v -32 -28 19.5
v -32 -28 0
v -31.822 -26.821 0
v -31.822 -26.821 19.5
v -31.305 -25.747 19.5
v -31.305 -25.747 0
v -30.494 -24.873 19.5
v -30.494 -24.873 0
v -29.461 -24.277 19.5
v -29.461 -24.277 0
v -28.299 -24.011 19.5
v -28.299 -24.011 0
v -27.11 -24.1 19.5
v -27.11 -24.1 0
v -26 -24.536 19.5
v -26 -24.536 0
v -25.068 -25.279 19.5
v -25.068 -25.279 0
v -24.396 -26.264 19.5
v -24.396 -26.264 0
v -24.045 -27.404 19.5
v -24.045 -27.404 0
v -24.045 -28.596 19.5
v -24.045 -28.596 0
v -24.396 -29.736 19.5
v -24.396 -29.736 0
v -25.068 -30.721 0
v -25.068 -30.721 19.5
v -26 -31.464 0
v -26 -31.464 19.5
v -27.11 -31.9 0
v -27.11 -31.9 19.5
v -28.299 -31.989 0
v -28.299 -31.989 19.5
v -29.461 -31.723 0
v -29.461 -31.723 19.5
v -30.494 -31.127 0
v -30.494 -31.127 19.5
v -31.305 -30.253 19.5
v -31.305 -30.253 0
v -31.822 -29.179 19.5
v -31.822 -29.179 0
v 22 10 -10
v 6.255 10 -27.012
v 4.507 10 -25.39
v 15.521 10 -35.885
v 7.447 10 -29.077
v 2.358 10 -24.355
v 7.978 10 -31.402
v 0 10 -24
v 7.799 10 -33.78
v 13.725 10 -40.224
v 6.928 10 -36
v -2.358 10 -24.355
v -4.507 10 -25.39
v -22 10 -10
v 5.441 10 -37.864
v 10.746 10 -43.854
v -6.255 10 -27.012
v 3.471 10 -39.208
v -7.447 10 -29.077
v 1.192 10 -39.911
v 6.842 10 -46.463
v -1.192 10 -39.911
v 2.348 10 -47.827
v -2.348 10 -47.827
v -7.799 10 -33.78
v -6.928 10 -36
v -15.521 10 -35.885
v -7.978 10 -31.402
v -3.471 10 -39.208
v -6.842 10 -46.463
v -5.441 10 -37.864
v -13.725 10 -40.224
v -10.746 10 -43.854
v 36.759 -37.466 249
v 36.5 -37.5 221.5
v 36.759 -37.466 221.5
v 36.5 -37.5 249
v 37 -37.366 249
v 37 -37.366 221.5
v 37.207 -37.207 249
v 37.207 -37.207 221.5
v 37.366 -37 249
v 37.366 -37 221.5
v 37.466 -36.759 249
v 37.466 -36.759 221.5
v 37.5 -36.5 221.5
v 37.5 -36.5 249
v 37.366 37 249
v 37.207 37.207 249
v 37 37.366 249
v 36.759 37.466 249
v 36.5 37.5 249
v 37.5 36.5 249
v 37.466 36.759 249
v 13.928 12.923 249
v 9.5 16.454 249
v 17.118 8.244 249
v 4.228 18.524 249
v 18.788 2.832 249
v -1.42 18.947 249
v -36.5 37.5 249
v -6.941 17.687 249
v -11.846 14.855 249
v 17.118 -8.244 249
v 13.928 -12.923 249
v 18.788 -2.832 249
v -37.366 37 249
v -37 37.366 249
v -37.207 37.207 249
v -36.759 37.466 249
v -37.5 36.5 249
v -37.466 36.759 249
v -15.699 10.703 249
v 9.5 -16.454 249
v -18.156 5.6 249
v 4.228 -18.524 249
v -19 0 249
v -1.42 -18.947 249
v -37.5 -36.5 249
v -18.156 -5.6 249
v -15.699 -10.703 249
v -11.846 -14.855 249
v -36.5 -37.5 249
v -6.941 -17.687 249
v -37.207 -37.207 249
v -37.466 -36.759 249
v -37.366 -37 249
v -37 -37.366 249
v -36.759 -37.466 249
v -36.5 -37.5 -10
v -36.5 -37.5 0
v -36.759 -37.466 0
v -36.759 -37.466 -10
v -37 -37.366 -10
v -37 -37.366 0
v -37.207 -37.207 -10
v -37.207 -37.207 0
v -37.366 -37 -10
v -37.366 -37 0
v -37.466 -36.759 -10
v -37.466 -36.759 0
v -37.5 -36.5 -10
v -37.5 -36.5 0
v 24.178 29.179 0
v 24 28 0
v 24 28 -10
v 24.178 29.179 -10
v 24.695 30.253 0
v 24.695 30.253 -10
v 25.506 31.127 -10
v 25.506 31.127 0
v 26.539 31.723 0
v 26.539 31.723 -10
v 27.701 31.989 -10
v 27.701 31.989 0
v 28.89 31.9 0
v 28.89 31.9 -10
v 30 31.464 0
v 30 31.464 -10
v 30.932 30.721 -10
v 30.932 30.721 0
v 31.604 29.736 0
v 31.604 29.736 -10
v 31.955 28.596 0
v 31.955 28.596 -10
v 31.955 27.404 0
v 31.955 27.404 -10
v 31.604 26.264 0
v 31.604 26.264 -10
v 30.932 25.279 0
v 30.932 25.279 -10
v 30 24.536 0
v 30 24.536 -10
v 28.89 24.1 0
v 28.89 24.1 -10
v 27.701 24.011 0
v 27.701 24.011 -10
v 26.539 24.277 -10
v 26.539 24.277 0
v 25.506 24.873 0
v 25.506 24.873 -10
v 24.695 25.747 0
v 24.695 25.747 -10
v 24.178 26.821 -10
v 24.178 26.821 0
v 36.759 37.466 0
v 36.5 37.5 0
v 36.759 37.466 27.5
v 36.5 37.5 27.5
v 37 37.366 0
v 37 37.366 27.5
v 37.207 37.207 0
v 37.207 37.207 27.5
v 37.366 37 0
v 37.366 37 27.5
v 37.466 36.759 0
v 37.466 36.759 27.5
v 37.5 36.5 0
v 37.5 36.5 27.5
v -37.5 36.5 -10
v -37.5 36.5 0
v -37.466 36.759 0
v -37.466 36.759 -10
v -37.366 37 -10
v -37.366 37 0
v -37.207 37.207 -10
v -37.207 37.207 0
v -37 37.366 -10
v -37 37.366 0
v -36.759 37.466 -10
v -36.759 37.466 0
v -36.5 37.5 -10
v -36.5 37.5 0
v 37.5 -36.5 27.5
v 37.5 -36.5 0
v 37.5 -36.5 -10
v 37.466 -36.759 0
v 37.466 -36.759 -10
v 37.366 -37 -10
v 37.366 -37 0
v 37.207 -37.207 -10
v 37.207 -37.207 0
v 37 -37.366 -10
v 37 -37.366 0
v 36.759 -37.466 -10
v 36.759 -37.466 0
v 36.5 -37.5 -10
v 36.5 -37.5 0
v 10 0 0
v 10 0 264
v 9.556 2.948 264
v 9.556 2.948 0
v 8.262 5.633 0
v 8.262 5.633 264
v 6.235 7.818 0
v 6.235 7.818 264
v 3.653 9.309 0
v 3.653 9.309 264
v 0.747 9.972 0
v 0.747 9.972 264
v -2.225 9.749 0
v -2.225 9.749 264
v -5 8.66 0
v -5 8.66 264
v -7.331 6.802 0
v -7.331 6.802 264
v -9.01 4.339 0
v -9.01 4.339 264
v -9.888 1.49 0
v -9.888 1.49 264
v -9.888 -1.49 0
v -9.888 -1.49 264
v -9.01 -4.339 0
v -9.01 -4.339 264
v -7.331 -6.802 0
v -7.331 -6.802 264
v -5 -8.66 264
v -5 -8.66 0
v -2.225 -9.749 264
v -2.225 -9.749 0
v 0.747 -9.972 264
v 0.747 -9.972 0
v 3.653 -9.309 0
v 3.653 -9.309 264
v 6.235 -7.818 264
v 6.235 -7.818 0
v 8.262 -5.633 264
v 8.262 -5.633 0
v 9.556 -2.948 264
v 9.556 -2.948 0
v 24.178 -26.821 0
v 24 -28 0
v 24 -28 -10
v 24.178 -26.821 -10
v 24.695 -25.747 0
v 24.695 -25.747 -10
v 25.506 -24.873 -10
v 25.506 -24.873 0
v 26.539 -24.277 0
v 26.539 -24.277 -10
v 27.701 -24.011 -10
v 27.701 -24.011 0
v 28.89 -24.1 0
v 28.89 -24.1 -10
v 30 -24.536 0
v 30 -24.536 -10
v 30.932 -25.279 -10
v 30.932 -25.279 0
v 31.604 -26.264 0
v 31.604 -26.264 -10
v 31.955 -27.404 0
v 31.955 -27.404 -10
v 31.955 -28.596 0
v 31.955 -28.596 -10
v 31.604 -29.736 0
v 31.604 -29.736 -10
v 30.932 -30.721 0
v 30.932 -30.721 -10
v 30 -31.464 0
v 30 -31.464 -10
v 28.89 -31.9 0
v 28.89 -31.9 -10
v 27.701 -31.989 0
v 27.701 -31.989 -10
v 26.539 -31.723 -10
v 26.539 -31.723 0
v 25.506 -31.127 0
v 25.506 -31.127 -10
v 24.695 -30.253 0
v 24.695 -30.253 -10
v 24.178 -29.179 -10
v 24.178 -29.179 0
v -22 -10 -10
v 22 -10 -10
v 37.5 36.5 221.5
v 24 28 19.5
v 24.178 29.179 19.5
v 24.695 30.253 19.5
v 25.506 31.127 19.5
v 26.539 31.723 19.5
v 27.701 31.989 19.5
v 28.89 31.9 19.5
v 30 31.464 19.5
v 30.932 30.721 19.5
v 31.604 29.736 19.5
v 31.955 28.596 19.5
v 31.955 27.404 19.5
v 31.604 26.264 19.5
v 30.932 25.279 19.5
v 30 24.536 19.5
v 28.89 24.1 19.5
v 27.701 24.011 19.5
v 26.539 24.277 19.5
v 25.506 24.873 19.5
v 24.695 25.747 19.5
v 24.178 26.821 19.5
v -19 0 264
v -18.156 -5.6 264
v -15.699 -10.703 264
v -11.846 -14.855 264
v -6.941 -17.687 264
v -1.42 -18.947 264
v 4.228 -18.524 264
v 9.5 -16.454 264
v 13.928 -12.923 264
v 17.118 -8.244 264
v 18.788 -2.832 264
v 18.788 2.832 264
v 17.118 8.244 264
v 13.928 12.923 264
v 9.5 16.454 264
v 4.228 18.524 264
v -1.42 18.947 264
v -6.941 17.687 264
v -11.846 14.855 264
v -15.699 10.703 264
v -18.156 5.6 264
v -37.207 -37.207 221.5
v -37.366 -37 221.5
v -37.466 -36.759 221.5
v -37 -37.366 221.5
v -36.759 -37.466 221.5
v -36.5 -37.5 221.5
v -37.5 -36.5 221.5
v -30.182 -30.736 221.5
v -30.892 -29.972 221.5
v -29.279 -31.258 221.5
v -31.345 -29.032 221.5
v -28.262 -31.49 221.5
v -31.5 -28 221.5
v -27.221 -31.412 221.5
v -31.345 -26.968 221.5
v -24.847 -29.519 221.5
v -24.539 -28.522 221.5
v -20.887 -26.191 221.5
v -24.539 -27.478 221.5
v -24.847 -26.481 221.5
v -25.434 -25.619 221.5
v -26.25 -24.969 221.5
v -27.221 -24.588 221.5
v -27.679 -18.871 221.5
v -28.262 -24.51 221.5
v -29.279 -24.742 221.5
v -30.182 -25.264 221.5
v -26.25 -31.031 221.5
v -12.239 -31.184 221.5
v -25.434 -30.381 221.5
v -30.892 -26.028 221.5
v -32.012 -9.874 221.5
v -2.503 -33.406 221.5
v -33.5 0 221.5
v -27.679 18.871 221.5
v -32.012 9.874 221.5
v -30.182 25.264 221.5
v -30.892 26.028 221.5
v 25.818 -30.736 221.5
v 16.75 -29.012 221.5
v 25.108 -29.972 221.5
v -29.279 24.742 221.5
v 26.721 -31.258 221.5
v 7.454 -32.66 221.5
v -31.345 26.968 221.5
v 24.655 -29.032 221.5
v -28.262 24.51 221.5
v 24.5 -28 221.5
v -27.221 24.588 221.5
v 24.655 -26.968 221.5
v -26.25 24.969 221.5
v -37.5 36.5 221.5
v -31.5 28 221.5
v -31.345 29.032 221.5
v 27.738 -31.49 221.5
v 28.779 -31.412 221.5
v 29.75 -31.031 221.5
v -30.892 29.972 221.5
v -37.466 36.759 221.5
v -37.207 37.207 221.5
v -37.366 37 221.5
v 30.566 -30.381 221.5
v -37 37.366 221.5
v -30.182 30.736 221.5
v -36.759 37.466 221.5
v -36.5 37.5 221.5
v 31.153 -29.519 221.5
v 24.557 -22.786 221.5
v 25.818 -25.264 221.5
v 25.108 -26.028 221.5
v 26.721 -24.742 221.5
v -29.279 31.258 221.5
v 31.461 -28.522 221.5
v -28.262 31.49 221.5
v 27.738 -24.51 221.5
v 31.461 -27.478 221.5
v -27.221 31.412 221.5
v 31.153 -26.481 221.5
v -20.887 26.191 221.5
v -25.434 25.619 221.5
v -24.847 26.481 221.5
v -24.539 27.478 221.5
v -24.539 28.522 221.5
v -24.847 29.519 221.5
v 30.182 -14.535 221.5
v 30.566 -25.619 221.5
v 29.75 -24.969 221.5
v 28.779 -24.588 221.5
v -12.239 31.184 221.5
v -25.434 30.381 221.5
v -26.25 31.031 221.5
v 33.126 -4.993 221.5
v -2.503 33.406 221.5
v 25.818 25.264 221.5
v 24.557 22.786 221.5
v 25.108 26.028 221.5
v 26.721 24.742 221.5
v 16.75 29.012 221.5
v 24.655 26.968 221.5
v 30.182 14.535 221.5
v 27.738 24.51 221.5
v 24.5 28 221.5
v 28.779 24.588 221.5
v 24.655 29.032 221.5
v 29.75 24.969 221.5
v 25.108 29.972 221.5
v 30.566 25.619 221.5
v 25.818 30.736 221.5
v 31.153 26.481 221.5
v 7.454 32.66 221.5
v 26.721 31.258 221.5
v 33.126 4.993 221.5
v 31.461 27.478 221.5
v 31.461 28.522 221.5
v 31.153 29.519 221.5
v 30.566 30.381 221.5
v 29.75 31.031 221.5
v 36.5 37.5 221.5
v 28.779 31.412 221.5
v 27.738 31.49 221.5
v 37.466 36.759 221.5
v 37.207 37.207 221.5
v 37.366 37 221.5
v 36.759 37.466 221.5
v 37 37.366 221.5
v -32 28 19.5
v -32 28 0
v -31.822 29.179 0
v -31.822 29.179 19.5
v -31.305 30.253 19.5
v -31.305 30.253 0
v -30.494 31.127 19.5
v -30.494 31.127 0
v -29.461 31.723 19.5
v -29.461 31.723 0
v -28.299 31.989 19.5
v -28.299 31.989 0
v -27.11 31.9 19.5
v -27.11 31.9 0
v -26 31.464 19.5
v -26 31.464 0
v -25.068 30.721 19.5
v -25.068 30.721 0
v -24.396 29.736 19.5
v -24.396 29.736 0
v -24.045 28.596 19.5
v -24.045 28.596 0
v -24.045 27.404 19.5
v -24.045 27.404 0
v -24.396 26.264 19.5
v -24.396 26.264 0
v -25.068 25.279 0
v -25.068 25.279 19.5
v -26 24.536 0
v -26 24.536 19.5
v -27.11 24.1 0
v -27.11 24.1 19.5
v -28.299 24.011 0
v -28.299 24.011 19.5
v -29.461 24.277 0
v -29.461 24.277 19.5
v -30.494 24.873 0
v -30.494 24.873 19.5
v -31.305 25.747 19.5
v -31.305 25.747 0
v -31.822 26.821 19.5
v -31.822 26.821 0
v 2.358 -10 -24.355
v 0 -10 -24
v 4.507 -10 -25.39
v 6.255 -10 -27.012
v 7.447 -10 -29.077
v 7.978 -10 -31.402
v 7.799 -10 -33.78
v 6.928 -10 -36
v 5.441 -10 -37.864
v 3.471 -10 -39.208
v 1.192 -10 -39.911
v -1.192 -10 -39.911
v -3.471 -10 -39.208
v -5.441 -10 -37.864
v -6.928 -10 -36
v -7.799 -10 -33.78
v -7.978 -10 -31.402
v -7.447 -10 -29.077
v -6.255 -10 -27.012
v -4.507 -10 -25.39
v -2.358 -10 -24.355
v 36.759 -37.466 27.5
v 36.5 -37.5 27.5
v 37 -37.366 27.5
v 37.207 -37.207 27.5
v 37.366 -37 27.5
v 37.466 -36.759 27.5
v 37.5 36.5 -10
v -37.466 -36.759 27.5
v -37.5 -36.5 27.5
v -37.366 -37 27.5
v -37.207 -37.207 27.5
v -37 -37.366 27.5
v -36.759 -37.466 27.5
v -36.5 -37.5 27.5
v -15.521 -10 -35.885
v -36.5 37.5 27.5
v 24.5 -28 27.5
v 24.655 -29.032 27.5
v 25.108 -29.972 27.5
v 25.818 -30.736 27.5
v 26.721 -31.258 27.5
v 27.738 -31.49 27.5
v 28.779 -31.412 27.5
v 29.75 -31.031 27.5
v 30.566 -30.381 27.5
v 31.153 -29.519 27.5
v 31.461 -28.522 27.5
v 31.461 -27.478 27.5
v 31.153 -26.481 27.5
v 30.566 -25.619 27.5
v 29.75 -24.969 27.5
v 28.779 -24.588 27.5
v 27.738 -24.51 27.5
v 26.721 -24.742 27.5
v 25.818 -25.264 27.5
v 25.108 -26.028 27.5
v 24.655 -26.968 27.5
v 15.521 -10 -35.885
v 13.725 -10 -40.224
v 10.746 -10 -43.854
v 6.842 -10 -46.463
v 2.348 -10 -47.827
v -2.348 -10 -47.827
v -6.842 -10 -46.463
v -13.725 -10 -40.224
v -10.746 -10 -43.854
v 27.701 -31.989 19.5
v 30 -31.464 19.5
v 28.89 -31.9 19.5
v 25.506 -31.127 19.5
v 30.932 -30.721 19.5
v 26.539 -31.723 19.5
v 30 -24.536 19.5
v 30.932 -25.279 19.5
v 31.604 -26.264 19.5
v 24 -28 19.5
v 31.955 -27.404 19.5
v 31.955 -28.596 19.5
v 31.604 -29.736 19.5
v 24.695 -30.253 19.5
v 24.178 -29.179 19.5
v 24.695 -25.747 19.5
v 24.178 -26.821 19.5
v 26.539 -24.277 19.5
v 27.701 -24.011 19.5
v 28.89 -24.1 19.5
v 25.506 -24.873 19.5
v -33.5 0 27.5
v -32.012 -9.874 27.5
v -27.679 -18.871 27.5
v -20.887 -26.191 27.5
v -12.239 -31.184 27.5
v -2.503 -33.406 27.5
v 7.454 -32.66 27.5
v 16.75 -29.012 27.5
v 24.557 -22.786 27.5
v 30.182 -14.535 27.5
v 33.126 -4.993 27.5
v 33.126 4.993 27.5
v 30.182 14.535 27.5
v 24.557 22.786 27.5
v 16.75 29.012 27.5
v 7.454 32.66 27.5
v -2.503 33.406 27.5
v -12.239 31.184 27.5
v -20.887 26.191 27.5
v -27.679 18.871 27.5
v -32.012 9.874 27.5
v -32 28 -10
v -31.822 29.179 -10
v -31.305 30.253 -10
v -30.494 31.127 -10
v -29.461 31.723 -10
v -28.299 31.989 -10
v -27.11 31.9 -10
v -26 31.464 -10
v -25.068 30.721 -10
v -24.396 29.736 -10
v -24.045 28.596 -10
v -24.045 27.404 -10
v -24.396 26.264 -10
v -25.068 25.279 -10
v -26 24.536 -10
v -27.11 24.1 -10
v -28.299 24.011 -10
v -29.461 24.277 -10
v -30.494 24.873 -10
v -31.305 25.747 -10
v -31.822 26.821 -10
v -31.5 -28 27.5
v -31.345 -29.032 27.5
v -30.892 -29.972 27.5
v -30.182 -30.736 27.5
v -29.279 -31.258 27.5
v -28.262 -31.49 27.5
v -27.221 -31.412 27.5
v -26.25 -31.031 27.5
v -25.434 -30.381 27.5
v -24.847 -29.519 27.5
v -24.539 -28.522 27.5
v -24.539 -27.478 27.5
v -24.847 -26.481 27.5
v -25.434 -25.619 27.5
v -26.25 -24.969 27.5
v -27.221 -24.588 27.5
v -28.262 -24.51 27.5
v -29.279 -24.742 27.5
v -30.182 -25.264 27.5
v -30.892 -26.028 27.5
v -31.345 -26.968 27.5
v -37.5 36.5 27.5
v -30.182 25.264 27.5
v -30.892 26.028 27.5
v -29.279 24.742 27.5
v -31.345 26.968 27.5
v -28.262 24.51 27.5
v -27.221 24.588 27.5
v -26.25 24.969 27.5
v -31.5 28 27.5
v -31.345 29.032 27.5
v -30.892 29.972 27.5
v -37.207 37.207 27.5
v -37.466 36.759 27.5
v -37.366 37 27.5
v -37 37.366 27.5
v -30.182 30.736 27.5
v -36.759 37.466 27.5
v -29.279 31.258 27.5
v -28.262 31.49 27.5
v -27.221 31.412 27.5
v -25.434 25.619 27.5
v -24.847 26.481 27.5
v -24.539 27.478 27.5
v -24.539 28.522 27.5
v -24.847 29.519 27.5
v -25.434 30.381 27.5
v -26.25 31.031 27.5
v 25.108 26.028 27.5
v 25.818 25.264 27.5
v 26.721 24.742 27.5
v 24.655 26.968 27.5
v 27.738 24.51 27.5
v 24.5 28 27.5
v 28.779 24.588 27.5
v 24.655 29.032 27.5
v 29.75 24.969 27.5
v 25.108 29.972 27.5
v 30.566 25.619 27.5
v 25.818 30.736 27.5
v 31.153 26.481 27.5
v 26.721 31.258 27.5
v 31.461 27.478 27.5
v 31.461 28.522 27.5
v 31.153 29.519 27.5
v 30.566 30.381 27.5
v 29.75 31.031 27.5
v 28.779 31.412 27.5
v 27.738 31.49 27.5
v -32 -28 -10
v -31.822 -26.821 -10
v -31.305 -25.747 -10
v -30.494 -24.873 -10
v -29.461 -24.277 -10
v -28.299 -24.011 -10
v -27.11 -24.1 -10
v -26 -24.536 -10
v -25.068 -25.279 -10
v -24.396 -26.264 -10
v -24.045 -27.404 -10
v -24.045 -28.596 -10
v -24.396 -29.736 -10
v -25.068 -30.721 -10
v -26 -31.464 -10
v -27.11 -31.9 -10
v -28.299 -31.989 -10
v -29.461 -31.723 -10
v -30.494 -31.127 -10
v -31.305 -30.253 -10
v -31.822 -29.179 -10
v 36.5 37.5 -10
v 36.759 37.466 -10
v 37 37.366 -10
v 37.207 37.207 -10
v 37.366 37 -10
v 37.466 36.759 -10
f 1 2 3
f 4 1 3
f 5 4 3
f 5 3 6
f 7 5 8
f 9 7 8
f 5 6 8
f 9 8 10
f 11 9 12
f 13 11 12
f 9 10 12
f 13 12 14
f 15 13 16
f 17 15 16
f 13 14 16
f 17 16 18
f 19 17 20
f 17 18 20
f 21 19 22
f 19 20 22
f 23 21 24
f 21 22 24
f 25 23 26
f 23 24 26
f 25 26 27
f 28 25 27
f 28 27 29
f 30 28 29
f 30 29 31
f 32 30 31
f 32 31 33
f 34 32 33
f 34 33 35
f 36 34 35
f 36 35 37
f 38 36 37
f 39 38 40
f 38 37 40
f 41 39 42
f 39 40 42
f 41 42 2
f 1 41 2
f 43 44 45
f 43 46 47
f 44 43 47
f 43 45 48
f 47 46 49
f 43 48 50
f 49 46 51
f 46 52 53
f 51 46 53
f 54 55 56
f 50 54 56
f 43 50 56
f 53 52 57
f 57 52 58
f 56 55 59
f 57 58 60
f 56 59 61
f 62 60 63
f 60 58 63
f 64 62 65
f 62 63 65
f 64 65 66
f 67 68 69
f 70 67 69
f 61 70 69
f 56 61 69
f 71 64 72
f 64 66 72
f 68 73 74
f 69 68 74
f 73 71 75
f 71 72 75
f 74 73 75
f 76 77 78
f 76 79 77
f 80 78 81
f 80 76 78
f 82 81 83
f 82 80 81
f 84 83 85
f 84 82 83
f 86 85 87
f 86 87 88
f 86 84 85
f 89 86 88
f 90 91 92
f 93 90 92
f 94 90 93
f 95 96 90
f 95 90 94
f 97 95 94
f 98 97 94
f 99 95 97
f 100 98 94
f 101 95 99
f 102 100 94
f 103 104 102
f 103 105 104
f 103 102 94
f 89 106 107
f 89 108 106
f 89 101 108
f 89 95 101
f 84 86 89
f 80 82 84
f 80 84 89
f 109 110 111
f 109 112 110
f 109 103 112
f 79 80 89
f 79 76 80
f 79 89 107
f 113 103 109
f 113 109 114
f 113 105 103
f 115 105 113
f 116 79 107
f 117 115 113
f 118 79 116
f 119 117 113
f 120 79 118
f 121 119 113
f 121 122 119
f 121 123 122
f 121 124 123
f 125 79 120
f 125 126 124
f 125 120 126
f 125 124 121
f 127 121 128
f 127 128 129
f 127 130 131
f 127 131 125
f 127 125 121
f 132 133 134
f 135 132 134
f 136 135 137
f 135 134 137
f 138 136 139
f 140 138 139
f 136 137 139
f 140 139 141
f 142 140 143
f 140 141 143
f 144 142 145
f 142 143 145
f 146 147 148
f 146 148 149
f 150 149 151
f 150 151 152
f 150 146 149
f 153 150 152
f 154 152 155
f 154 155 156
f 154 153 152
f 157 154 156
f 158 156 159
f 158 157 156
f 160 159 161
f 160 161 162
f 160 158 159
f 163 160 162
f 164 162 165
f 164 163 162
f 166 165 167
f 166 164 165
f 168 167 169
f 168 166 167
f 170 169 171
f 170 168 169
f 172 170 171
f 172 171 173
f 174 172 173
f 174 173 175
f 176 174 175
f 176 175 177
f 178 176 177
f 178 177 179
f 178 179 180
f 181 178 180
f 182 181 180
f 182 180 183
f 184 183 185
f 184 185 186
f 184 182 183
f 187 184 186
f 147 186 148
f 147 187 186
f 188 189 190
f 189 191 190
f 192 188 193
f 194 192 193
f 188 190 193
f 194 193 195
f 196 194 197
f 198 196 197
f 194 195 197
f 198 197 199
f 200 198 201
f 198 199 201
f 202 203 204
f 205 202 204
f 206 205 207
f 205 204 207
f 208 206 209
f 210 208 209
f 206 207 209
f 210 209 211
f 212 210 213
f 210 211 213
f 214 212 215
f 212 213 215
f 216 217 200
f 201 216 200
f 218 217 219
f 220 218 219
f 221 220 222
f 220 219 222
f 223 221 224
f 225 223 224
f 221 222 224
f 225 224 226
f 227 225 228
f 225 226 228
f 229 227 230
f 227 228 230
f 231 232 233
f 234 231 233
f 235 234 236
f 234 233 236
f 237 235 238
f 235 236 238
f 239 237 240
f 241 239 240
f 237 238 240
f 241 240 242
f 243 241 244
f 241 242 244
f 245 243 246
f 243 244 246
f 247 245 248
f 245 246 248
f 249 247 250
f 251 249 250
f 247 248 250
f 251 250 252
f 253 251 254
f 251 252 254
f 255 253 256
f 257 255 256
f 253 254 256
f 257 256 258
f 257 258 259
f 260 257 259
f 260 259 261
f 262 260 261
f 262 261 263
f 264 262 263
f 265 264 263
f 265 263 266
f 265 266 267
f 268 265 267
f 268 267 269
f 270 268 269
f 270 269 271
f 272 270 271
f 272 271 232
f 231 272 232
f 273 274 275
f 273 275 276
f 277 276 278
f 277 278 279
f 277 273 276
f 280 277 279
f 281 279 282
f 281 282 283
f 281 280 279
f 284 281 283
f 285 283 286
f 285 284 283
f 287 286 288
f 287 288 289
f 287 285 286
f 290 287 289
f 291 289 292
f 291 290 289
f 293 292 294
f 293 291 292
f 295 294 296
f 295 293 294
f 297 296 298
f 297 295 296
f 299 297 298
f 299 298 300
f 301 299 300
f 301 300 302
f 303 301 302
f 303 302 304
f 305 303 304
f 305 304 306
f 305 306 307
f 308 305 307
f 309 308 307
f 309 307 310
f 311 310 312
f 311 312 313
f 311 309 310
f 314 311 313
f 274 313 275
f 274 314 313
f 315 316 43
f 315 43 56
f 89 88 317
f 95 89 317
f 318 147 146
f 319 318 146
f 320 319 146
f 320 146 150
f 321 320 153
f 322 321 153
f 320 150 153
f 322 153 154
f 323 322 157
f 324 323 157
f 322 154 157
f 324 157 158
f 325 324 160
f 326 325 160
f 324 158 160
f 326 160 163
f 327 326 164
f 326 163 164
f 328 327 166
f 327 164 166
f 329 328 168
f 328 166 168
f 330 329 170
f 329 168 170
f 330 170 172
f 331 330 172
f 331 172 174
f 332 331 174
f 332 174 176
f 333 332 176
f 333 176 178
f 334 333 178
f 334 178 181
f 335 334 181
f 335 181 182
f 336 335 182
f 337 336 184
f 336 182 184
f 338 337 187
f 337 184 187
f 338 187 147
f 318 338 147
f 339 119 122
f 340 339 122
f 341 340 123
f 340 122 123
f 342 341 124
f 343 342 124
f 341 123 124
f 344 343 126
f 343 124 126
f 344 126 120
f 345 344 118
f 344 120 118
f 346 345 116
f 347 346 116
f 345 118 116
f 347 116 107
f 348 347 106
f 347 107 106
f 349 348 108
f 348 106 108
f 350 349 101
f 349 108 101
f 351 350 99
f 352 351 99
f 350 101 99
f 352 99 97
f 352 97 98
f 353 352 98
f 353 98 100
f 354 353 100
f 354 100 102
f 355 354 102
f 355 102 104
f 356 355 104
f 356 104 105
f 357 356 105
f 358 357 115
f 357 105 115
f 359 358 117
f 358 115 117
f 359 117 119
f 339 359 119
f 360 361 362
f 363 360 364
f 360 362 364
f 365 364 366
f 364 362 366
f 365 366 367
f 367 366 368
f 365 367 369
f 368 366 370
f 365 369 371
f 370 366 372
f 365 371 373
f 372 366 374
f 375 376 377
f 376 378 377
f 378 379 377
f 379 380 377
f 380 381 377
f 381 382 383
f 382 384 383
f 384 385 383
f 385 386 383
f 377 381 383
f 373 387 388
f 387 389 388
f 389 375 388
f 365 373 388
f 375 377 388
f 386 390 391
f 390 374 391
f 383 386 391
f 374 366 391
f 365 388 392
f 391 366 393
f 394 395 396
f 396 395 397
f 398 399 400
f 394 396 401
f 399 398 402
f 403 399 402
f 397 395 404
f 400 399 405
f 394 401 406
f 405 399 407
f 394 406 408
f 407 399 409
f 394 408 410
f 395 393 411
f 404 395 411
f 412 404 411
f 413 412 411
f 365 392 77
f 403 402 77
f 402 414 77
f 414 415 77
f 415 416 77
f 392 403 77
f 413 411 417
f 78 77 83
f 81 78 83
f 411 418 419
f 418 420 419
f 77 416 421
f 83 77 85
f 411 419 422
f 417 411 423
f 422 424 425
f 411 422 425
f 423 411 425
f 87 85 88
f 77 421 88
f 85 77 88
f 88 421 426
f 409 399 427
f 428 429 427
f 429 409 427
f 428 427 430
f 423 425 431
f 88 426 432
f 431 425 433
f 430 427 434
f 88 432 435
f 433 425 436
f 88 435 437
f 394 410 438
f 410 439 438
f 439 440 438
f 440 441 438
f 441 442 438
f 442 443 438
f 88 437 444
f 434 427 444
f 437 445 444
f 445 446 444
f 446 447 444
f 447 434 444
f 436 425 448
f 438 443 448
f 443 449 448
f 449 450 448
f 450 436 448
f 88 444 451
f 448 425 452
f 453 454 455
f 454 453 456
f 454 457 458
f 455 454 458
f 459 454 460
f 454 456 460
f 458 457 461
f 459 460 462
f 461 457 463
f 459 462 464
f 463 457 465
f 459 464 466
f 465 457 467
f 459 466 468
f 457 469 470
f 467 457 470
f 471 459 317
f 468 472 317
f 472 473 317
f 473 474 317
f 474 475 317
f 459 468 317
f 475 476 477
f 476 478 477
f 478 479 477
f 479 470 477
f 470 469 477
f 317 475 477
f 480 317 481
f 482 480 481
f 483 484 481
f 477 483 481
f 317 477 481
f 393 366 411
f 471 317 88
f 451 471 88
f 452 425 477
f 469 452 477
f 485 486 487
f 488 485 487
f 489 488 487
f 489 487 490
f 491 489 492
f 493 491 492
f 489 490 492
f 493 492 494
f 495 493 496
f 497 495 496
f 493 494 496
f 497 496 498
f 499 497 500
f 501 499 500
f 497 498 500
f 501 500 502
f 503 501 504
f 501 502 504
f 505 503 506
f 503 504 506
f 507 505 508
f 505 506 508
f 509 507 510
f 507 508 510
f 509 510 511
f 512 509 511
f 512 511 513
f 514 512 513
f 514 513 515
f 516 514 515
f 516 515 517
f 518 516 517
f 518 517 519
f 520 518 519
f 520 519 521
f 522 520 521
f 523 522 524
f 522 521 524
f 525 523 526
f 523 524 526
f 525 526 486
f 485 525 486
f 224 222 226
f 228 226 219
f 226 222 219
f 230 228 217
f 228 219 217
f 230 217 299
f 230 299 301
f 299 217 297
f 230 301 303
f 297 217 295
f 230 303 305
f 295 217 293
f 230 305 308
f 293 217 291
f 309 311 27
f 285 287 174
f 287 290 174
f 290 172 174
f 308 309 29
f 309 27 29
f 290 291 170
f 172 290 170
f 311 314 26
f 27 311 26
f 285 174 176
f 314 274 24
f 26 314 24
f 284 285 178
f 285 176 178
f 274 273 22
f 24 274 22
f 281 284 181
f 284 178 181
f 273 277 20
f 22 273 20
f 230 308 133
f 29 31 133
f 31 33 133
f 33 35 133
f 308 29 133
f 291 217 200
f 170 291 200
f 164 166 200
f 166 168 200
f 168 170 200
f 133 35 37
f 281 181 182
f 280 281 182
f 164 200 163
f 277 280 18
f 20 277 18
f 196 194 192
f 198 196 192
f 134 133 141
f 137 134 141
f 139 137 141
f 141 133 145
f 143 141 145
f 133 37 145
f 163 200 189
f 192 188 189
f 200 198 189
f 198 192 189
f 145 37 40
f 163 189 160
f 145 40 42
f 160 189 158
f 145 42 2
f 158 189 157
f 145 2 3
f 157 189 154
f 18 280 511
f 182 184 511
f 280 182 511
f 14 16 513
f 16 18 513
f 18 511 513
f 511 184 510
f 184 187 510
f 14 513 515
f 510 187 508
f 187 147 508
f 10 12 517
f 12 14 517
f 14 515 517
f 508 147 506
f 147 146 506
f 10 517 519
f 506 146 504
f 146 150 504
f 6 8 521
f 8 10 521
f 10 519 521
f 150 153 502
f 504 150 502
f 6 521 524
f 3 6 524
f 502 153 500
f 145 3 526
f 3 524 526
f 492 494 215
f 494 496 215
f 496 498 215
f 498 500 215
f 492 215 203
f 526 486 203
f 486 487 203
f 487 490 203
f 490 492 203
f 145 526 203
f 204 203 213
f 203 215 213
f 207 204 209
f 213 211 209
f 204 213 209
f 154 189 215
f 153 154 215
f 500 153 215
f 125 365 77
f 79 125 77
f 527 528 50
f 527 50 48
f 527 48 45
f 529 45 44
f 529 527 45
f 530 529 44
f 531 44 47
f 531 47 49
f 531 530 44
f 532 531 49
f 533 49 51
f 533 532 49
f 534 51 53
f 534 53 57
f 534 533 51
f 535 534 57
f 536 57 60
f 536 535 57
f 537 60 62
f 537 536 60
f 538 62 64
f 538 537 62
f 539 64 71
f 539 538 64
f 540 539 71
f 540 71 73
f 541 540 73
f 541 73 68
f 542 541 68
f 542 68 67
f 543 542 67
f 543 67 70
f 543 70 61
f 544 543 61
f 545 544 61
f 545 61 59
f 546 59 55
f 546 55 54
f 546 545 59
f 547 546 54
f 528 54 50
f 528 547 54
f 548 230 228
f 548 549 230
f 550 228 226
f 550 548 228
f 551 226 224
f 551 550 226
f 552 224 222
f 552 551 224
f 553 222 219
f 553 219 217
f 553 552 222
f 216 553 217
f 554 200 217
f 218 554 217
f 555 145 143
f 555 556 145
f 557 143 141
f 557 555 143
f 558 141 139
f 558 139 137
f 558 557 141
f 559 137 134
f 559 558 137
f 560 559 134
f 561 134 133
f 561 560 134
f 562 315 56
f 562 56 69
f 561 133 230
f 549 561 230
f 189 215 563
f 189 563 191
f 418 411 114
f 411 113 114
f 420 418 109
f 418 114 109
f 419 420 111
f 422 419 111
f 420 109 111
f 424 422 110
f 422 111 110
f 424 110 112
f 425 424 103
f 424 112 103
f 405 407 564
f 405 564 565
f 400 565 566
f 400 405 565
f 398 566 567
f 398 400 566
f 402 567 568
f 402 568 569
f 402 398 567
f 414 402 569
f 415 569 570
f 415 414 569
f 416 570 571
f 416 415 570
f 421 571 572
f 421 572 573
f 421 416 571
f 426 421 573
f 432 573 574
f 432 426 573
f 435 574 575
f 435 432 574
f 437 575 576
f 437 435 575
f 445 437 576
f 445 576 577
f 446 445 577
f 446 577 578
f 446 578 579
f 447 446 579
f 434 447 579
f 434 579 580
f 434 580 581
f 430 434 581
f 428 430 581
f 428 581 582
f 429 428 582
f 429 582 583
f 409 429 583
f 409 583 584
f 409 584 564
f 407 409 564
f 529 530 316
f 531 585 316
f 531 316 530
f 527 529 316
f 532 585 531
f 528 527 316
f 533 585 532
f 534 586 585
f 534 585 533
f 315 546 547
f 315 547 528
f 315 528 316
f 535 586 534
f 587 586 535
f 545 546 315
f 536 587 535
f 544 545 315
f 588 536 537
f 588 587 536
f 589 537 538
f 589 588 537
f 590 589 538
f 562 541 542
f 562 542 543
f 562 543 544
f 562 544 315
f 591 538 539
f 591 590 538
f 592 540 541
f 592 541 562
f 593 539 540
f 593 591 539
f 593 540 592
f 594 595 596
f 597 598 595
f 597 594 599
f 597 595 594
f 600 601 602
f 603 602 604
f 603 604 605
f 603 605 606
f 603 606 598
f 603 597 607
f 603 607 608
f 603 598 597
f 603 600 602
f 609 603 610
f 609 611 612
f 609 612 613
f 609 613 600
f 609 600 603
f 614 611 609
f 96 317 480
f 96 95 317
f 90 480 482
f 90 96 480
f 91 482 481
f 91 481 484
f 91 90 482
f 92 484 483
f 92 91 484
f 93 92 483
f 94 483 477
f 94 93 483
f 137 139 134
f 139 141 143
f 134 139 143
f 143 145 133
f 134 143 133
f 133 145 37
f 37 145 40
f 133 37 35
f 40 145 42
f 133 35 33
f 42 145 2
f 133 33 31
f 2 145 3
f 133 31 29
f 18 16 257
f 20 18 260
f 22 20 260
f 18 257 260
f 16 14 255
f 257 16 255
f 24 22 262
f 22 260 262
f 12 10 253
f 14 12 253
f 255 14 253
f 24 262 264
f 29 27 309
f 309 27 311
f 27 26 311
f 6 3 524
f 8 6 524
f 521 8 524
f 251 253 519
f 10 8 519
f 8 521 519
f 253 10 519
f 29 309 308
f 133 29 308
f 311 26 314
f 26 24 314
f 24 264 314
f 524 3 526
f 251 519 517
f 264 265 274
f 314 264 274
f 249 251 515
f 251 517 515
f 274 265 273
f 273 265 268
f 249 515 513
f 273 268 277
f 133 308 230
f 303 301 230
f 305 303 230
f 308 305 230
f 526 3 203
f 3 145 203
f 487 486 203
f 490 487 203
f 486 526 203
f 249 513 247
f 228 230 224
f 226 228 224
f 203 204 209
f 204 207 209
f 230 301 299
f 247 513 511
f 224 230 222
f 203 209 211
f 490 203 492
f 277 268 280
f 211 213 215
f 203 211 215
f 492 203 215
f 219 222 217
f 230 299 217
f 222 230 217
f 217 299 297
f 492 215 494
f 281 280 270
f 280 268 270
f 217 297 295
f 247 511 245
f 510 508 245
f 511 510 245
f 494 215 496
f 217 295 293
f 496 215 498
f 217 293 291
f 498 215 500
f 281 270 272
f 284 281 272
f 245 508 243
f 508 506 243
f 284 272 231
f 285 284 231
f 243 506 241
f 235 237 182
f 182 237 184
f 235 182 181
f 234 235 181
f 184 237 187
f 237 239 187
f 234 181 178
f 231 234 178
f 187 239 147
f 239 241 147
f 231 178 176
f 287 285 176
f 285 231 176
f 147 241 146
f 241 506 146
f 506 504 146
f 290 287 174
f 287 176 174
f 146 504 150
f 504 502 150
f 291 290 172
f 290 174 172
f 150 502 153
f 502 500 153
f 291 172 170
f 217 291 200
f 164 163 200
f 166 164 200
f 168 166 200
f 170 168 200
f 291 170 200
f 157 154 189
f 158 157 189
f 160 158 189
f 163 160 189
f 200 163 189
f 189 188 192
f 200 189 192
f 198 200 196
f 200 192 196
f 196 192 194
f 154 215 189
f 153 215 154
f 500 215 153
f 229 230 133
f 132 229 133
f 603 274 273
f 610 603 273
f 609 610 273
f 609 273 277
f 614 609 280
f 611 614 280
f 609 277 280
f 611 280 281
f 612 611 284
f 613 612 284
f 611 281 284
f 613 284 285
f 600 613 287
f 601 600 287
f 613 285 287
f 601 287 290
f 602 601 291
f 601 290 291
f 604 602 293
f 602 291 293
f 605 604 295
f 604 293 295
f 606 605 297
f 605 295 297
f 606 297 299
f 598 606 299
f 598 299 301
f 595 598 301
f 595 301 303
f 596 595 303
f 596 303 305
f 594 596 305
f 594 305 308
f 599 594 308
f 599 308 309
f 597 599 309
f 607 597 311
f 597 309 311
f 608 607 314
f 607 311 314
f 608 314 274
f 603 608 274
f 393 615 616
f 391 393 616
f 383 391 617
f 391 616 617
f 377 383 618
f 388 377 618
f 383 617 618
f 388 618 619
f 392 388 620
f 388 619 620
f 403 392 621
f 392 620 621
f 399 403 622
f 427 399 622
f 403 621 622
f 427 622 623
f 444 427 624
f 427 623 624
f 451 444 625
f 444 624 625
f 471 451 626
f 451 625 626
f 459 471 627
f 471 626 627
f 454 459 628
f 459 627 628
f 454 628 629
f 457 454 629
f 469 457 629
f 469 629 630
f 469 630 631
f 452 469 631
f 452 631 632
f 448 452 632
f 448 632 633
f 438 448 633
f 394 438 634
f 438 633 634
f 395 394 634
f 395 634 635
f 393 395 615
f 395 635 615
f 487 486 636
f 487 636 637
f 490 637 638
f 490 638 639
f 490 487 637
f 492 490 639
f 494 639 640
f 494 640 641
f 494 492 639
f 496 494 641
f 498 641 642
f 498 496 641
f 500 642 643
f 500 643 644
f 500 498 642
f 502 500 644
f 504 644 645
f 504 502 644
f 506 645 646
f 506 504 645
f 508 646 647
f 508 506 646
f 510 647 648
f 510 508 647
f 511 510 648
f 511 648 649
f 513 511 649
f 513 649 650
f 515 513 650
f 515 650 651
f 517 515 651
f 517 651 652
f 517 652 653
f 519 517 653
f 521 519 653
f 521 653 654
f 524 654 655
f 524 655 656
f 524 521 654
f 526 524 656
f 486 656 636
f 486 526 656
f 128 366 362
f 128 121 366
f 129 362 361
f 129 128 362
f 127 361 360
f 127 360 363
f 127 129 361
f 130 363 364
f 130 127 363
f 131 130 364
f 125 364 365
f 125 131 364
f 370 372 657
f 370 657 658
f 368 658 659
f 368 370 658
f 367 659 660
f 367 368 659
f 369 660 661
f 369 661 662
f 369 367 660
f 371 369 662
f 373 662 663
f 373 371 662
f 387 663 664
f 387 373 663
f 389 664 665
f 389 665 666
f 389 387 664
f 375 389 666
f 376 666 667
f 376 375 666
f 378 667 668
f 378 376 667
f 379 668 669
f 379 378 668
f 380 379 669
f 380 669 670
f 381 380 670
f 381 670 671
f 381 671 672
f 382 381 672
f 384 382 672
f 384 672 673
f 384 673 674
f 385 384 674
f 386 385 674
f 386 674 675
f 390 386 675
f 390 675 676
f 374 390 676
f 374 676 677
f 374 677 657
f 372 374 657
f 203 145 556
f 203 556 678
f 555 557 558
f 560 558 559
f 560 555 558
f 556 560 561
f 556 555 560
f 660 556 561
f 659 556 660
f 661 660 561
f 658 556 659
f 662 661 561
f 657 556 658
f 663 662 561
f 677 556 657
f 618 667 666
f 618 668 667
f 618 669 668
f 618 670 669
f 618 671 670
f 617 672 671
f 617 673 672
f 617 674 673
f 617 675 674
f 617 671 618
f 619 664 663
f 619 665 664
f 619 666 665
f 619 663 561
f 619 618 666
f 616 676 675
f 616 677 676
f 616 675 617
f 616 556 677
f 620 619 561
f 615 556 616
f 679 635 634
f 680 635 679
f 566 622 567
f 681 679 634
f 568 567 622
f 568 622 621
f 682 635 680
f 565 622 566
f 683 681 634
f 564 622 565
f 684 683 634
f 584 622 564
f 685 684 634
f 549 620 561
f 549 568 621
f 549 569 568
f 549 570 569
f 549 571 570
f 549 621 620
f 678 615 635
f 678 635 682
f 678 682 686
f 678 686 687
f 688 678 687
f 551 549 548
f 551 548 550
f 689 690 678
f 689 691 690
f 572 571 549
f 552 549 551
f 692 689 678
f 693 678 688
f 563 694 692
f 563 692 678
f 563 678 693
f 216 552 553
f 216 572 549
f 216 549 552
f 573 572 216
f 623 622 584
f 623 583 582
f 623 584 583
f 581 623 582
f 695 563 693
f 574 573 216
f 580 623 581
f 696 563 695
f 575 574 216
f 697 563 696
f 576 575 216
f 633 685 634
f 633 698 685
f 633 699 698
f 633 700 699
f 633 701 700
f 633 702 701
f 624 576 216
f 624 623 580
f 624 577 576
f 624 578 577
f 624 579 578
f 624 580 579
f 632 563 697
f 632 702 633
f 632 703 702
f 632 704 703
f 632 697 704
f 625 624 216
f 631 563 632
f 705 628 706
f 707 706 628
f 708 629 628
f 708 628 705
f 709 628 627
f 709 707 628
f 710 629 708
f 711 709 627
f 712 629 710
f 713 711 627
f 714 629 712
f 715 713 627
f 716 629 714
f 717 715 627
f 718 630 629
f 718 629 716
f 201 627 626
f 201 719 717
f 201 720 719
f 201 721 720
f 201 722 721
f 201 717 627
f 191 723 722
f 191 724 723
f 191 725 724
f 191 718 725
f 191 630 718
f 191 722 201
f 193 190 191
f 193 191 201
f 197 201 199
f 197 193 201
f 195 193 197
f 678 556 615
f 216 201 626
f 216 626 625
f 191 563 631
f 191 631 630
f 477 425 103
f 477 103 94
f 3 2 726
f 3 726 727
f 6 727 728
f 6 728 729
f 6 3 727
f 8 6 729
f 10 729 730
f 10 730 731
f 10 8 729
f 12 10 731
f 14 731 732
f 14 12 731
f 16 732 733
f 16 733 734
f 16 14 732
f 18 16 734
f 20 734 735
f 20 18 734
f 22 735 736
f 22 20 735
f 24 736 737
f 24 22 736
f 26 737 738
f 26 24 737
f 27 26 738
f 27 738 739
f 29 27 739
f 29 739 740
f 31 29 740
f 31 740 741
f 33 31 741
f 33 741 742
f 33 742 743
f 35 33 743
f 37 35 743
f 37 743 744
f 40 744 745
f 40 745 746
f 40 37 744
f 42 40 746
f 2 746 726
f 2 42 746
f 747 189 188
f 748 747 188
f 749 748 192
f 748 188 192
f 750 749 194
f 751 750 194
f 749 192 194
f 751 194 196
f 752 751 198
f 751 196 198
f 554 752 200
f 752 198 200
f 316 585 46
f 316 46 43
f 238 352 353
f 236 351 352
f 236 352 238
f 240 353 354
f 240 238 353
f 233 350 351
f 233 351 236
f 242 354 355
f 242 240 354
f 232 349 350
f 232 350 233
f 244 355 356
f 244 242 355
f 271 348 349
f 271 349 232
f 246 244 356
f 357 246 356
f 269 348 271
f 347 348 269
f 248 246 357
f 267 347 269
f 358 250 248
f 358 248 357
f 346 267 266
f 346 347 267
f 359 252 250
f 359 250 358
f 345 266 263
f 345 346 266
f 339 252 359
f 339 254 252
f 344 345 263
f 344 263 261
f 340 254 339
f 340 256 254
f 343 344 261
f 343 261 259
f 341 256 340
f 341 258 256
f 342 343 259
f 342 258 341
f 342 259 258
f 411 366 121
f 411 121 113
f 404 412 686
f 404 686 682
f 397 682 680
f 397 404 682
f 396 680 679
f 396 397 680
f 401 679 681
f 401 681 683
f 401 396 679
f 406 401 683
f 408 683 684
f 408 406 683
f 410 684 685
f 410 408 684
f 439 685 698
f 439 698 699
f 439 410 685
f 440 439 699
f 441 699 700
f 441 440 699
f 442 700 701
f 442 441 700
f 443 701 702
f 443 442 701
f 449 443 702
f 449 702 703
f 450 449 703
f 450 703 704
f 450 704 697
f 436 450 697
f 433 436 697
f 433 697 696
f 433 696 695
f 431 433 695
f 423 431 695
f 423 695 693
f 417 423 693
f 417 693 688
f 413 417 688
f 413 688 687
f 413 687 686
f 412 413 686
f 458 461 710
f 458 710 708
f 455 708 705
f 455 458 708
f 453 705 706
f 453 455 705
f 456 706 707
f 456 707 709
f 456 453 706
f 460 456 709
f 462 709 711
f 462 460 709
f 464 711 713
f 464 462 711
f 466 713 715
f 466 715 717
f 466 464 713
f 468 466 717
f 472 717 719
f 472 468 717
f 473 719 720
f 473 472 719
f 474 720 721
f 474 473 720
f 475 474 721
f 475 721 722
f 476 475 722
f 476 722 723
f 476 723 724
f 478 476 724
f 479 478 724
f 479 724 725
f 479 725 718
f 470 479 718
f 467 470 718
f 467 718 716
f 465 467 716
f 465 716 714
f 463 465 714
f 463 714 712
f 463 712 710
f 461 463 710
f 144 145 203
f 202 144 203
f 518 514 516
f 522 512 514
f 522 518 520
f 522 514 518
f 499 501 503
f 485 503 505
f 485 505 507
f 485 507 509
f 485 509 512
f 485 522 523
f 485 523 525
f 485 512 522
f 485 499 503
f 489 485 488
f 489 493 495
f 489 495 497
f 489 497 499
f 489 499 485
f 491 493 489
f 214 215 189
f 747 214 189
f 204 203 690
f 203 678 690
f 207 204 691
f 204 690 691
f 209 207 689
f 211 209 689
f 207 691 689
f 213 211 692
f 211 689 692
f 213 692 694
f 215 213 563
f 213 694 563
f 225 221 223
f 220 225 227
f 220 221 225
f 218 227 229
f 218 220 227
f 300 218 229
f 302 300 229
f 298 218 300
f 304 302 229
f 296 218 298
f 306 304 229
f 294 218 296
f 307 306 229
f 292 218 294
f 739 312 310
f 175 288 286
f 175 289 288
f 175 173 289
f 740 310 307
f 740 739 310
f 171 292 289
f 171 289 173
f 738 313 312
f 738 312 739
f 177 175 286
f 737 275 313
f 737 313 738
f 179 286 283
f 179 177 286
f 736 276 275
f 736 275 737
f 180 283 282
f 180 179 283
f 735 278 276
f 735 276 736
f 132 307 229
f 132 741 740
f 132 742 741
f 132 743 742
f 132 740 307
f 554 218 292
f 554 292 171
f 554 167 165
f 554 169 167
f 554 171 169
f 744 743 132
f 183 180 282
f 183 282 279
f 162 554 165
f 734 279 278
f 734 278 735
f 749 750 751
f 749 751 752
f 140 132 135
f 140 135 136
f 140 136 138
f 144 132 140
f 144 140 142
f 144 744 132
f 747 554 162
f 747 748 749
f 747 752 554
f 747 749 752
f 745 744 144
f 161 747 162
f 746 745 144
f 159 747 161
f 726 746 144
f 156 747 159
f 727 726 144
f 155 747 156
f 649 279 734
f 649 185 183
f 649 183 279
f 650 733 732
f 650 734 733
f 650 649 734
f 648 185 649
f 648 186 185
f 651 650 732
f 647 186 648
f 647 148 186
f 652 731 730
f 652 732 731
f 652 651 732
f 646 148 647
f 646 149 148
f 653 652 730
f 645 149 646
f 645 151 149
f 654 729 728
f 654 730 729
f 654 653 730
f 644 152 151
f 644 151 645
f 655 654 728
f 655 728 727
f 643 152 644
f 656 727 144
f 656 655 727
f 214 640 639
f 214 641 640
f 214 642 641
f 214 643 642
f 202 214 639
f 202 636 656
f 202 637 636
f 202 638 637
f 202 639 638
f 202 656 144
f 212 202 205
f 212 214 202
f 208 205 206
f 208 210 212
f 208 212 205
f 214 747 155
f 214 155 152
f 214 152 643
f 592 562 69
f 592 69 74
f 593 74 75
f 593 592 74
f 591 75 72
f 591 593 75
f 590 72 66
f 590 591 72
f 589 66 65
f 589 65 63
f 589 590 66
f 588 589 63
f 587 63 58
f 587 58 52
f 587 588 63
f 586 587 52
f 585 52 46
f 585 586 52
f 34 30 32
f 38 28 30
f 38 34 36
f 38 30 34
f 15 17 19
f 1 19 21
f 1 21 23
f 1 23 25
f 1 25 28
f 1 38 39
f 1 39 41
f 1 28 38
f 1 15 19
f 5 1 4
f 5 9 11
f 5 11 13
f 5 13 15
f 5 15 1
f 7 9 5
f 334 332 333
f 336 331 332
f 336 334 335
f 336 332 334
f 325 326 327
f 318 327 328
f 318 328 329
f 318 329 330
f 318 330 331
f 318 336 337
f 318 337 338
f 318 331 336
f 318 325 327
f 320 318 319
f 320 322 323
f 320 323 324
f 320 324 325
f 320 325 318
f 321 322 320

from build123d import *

# Parameters (mm, degrees)
SKETCH1_W                = 75
SKETCH1_H                = 75
BOSS_EXTRUDE1_DEPTH      = 27.5
SKETCH2_R                = 33.5
BOSS_EXTRUDE2_DEPTH      = 194
SKETCH3_W                = 75
SKETCH3_H                = 75
BOSS_EXTRUDE3_DEPTH      = 27.5
SKETCH4_R                = 3.5
BOSS_EXTRUDE4_DEPTH      = 234.5
SKETCH5_R                = 4
CUT_EXTRUDE1_DEPTH       = 19.5
FILLET1_R                = 1
SKETCH6_R                = 19
BOSS_EXTRUDE5_DEPTH      = 15
SKETCH7_R                = 10
CUT_EXTRUDE2_DEPTH       = 300
SKETCH9_R                = 4
BOSS_EXTRUDE6_DEPTH      = 10
BOSS_EXTRUDE7_DEPTH      = 10
BOSS_EXTRUDE7_DEPTH_BACK = 10
SKETCH10_R               = 8


with BuildPart() as part:
    # Sketch1 → Boss-Extrude1 (new body)
    with BuildSketch(Plane.XY):
        Rectangle(SKETCH1_W, SKETCH1_H)
    extrude(amount=BOSS_EXTRUDE1_DEPTH)

    # Sketch2 → Boss-Extrude2 (add)
    with BuildSketch(Plane.XY.offset(27.5)):
        with Locations(Location((0, 0, 0), (0, 0, 180))):
            Circle(SKETCH2_R)
    extrude(amount=BOSS_EXTRUDE2_DEPTH)

    # Sketch3 → Boss-Extrude3 (add)
    with BuildSketch(Plane.XY.offset(221.5)):
        Rectangle(SKETCH3_W, SKETCH3_H)
    extrude(amount=BOSS_EXTRUDE3_DEPTH)

    # Sketch4 → Boss-Extrude4 (add)
    with BuildSketch(Plane.XY.offset(249)):
        with Locations(Location((-28, 28, 0), (0, 0, 180))):
            Circle(SKETCH4_R)
        with Locations(Location((28, 28, 0), (0, 0, 180))):
            Circle(SKETCH4_R)
        with Locations(Location((28, -28, 0), (0, 0, 180))):
            Circle(SKETCH4_R)
        with Locations(Location((-28, -28, 0), (0, 0, 180))):
            Circle(SKETCH4_R)
    extrude(amount=-BOSS_EXTRUDE4_DEPTH)

    # Sketch5 → Cut-Extrude1 (cut)
    with BuildSketch(Plane(origin=(0, 0, 0), x_dir=(-1, 0, 0), z_dir=(0, 0, -1))):
        with Locations((-28, 28)):
            Circle(SKETCH5_R)
        with Locations((28, 28)):
            Circle(SKETCH5_R)
        with Locations((28, -28)):
            Circle(SKETCH5_R)
        with Locations((-28, -28)):
            Circle(SKETCH5_R)
    extrude(amount=-CUT_EXTRUDE1_DEPTH, mode=Mode.SUBTRACT)

    # Fillet1
    fillet1_edges = [part.edges().sort_by_distance(p)[0] for p in [
        (37.5, -37.5, 235.25),
        (37.5, 37.5, 235.25),
        (-37.5, 37.5, 235.25),
        (-37.5, -37.5, 235.25),
        (37.5, -37.5, 13.75),
        (-37.5, -37.5, 13.75),
        (-37.5, 37.5, 13.75),
        (37.5, 37.5, 13.75),
    ]]
    fillet(fillet1_edges, radius=FILLET1_R)

    # Sketch6 → Boss-Extrude5 (add)
    with BuildSketch(Plane.XY.offset(249)):
        with Locations(Location((0, 0, 0), (0, 0, 180))):
            Circle(SKETCH6_R)
    extrude(amount=BOSS_EXTRUDE5_DEPTH)

    # Sketch7 → Cut-Extrude2 (cut)
    with BuildSketch(Plane.XY.offset(264)):
        Circle(SKETCH7_R)
    extrude(amount=-CUT_EXTRUDE2_DEPTH, mode=Mode.SUBTRACT)


with BuildPart() as body_2:
    # Sketch9 → Boss-Extrude6 (new body)
    with BuildSketch(Plane(origin=(0, 0, 0), x_dir=(-1, 0, 0), z_dir=(0, 0, -1))):
        with BuildLine():
            Line((37.5, -36.5), (37.5, 36.5))
            ThreePointArc((37.5, 36.5), (37.207106781, 37.207106781), (36.5, 37.5))
            Line((36.5, 37.5), (-36.5, 37.5))
            ThreePointArc((-36.5, 37.5), (-37.207106781, 37.207106781), (-37.5, 36.5))
            Line((-37.5, 36.5), (-37.5, -36.5))
            ThreePointArc((-37.5, -36.5), (-37.207106781, -37.207106781), (-36.5, -37.5))
            Line((-36.5, -37.5), (36.5, -37.5))
            ThreePointArc((36.5, -37.5), (37.207106781, -37.207106781), (37.5, -36.5))
        make_face()
        with Locations((-28, 28)):
            Circle(SKETCH9_R, mode=Mode.SUBTRACT)
        with Locations((28, 28)):
            Circle(SKETCH9_R, mode=Mode.SUBTRACT)
        with Locations((28, -28)):
            Circle(SKETCH9_R, mode=Mode.SUBTRACT)
        with Locations((-28, -28)):
            Circle(SKETCH9_R, mode=Mode.SUBTRACT)
    extrude(amount=BOSS_EXTRUDE6_DEPTH)


with BuildPart() as body_3:
    # Sketch10 → Boss-Extrude7 (new, two sides: drawn at the far end of the back side and taken through both)
    with BuildSketch(Plane(origin=(0, 0, 0), x_dir=(1, 0, 0), z_dir=(0, 1, 0)).offset(-BOSS_EXTRUDE7_DEPTH_BACK)):
        with BuildLine():
            Line((-22, 10), (-15.521210228, 35.884846592))
            ThreePointArc((-15.521210228, 35.884846592), (0, 48), (15.521210228, 35.884846592))
            Line((15.521210228, 35.884846592), (22, 10))
            Line((22, 10), (-22, 10))
        make_face()
        with Locations(Location((0, 32, 0), (0, 0, 270))):
            Circle(SKETCH10_R, mode=Mode.SUBTRACT)
    extrude(amount=BOSS_EXTRUDE7_DEPTH + BOSS_EXTRUDE7_DEPTH_BACK)


solid = Compound([part.part, body_2.part, body_3.part])
